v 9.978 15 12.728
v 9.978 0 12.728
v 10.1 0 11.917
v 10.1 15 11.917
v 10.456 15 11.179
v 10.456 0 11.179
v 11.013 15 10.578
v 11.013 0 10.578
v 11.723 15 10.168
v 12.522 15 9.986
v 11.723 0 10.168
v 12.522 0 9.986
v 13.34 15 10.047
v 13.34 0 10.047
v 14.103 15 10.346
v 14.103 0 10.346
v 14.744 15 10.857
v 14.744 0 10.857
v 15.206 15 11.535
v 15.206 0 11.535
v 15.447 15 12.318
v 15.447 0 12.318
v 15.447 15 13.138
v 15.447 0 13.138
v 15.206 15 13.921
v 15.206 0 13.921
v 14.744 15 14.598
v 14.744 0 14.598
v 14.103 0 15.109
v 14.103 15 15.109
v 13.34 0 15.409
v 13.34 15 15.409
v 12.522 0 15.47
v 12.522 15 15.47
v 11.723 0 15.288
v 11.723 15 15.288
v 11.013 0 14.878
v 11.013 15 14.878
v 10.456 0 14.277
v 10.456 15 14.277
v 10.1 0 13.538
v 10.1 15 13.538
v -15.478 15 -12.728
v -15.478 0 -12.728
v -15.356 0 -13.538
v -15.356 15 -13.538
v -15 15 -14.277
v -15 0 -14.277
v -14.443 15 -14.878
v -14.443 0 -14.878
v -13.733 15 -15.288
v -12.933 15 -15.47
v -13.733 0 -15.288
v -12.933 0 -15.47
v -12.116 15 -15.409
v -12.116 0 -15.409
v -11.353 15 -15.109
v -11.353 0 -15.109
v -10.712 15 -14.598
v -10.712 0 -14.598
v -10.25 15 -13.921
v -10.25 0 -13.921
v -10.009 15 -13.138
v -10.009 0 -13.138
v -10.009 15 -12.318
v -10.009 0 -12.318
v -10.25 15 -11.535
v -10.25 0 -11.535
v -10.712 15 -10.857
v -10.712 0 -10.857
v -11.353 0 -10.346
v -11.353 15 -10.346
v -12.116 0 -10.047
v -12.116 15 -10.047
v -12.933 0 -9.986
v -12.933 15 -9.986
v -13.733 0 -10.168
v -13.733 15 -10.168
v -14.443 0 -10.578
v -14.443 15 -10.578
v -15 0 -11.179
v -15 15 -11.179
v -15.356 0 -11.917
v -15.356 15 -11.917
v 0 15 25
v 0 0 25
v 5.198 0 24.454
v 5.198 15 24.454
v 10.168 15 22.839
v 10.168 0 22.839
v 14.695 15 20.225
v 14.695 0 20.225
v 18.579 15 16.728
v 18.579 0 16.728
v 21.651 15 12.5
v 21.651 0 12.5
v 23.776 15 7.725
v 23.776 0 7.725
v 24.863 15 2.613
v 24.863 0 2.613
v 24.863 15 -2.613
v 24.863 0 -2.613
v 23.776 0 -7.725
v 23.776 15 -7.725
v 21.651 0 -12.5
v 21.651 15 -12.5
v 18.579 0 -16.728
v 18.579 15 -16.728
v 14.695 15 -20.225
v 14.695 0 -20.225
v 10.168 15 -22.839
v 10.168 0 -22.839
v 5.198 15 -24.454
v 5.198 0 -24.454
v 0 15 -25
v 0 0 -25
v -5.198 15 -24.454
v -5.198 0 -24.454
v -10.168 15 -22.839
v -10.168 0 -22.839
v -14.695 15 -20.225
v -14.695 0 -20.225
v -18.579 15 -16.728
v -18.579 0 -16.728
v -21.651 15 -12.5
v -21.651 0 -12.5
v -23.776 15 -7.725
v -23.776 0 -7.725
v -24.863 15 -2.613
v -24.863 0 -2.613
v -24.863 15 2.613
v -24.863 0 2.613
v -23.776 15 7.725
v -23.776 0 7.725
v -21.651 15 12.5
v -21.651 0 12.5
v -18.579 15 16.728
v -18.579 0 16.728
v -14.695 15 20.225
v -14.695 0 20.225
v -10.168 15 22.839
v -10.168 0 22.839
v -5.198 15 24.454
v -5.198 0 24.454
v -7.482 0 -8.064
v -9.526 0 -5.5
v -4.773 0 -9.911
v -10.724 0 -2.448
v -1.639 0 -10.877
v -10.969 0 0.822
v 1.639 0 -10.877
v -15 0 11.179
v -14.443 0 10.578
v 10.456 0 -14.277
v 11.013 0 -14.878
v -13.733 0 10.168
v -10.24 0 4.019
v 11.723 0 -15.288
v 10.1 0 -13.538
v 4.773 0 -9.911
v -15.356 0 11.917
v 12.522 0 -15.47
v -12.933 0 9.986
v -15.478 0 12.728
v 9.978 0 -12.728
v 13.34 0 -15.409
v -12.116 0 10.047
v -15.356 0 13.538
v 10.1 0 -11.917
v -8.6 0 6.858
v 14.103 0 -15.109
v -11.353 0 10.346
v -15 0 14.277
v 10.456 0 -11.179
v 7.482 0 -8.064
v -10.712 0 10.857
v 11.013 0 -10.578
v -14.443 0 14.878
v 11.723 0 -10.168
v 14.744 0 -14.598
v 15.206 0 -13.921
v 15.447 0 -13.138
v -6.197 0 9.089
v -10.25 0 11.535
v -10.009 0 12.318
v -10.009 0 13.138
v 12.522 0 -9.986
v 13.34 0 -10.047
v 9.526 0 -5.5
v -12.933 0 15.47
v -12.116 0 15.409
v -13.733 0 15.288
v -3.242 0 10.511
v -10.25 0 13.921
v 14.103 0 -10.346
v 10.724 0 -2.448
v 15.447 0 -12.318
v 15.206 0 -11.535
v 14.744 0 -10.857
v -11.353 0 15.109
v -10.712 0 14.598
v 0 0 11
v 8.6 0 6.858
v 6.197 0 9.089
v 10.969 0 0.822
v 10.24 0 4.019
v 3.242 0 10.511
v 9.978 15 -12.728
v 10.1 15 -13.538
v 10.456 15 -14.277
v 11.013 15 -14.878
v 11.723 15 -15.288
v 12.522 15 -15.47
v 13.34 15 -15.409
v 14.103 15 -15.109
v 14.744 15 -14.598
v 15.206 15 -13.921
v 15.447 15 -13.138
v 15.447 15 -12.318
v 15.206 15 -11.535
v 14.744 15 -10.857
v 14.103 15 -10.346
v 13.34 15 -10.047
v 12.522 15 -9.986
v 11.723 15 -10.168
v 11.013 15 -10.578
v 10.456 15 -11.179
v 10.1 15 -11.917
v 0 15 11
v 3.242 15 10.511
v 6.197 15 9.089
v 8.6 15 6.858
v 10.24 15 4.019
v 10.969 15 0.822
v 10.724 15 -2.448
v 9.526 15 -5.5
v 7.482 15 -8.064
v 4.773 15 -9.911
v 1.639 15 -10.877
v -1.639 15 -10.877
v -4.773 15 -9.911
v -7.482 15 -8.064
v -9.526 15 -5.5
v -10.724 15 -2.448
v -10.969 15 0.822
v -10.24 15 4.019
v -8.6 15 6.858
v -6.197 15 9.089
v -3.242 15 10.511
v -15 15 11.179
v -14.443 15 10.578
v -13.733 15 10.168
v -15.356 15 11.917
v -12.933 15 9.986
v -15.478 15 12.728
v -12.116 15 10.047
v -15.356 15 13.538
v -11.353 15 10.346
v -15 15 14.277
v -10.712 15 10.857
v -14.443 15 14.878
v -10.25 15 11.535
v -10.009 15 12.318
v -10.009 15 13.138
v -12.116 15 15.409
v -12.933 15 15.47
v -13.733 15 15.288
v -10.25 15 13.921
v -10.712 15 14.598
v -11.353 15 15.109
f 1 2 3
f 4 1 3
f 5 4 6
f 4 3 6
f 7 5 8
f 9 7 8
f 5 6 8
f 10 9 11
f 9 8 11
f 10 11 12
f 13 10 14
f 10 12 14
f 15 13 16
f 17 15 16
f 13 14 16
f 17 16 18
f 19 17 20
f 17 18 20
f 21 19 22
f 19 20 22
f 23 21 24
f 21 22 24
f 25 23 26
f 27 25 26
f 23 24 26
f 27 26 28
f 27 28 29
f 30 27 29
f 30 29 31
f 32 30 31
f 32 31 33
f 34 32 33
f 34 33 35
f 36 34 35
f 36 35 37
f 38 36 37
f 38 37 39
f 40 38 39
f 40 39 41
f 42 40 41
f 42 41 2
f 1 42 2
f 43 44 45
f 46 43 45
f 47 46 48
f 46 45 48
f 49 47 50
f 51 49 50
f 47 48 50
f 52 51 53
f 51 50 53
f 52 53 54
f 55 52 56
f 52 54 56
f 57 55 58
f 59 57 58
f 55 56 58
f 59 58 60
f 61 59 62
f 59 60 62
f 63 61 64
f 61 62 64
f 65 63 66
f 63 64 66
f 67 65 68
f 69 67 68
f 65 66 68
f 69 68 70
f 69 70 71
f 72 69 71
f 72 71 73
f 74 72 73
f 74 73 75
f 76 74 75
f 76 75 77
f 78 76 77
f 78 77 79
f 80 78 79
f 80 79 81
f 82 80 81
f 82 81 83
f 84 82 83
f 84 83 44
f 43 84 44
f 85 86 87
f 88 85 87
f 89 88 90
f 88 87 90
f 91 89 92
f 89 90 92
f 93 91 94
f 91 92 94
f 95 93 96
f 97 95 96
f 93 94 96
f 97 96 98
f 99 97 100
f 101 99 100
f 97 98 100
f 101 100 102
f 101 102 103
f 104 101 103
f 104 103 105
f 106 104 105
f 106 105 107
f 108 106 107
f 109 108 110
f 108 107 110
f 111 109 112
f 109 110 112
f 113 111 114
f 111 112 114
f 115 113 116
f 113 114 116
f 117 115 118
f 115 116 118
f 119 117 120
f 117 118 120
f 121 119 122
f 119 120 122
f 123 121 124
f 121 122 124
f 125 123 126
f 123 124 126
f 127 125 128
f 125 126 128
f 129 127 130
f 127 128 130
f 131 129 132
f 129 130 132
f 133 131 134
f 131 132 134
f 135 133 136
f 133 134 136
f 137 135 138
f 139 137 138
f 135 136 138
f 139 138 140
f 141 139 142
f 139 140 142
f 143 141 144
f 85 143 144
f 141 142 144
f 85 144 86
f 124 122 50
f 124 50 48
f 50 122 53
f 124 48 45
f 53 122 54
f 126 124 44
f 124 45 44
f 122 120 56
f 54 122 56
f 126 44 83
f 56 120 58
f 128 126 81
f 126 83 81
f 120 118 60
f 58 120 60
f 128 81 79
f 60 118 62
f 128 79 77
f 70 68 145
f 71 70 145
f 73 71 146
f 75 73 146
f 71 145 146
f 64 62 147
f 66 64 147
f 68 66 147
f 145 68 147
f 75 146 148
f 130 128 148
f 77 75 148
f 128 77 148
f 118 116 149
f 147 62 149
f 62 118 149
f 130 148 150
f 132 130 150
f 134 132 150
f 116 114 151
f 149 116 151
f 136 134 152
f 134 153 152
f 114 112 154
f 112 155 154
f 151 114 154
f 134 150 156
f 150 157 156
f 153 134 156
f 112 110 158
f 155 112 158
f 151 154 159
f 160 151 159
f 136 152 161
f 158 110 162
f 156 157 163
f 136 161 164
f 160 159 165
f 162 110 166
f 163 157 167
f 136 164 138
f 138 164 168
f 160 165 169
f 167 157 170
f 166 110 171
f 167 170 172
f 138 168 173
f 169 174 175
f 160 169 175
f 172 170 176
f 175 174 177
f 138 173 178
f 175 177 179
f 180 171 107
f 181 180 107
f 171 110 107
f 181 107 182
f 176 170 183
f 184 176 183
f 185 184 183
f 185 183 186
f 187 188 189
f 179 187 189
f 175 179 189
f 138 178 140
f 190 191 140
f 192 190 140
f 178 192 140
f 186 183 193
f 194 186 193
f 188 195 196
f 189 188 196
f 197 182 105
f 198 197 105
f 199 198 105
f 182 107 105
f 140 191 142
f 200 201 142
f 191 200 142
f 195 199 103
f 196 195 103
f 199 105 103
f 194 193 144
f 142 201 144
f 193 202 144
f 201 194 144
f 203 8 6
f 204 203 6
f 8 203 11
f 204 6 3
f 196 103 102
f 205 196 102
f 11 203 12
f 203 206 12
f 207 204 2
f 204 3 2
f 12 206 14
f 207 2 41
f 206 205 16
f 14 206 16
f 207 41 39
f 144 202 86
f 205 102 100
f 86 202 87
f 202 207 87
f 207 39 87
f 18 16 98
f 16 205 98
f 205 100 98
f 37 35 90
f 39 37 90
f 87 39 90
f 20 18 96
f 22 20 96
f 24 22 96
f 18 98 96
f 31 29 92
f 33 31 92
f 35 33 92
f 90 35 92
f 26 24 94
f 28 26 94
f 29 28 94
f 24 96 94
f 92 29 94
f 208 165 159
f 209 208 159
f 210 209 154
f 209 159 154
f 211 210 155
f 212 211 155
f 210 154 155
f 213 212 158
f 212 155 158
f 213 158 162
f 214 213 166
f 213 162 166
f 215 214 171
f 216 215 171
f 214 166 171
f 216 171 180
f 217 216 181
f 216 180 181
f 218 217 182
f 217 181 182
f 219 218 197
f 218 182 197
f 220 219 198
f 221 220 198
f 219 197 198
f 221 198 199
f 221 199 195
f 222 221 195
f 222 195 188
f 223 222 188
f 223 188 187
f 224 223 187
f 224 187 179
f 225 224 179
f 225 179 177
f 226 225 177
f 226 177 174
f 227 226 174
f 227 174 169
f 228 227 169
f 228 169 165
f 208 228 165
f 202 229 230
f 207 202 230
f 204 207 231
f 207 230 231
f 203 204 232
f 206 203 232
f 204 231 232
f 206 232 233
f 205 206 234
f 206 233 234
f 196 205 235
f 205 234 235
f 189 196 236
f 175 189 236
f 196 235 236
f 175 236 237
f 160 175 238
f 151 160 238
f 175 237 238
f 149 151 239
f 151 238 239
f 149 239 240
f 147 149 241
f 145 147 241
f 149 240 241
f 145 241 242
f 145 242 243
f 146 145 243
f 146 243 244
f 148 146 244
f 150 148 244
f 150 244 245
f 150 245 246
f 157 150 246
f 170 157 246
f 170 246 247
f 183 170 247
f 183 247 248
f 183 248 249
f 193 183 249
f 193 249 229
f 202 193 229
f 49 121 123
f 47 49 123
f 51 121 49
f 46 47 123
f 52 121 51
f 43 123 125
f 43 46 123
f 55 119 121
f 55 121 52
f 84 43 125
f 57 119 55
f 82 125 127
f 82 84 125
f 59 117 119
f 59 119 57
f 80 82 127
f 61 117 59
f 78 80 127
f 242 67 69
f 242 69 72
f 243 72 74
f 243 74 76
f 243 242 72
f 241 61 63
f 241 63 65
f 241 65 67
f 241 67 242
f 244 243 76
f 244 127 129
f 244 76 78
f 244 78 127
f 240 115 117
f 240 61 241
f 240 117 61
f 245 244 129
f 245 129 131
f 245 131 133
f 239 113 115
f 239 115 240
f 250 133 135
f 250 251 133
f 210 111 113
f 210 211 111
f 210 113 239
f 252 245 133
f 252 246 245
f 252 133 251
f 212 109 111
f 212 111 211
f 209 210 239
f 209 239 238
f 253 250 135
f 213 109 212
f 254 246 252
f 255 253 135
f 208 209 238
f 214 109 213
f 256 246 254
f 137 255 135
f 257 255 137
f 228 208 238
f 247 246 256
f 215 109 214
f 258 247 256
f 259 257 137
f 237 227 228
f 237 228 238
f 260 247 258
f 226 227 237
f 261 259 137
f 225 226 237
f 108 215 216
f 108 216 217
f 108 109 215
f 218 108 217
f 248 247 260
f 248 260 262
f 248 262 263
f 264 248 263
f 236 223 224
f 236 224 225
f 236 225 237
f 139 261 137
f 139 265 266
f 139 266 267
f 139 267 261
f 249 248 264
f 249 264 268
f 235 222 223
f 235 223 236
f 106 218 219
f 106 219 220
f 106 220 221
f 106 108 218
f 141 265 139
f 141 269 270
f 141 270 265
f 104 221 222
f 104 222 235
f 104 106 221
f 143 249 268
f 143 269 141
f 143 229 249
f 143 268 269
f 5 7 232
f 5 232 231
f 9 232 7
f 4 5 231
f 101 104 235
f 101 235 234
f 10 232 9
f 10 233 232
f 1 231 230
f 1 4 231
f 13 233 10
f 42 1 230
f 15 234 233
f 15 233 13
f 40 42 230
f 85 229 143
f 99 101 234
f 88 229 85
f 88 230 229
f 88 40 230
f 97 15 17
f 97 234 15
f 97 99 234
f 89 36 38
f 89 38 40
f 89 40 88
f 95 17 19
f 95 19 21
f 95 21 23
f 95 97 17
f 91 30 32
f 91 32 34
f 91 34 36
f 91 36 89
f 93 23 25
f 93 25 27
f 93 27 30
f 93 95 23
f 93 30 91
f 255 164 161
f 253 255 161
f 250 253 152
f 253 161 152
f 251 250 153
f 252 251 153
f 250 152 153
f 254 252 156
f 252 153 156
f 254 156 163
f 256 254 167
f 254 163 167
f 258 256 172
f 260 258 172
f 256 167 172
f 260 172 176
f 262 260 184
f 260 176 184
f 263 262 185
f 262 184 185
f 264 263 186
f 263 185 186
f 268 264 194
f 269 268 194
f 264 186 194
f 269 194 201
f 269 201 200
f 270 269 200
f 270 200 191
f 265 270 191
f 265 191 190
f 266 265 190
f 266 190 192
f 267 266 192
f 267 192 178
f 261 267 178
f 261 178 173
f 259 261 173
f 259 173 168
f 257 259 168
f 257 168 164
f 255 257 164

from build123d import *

# Parameters (mm, degrees)
SKETCH_1_R          = 25
EXTRUDE_1_DEPTH     = 15
SKETCH_2_R          = 11
CUT_EXTRUDE_1_DEPTH = 39.405728739
HOLE_WIZARD_M5_1_D  = 5.5


with BuildPart() as part:
    # ｽｹｯﾁ1 → ﾎﾞｽ - 押し出し1 (new body)
    with BuildSketch(Plane(origin=(0, 0, 0), x_dir=(1, 0, 0), z_dir=(0, 1, 0))):
        with Locations(Location((0, 0, 0), (0, 0, 270))):
            Circle(SKETCH_1_R)
    extrude(amount=EXTRUDE_1_DEPTH)

    # ｽｹｯﾁ2 → ｶｯﾄ - 押し出し1 (cut, through all)
    with BuildSketch(Plane(origin=(0, 15, 0), x_dir=(1, 0, 0), z_dir=(0, 1, 0))):
        with Locations(Location((0, 0, 0), (0, 0, 270))):
            Circle(SKETCH_2_R)
    extrude(amount=-CUT_EXTRUDE_1_DEPTH, mode=Mode.SUBTRACT)

    # M5 すきま穴1 (through all)
    with Locations(Plane(origin=(0, 15, 0), x_dir=(1, 0, 0), z_dir=(0, 1, 0))):
        with Locations((-12.727922061, 12.727922061), (12.727922061, -12.727922061), (-12.727922061, -12.727922061), (12.727922061, 12.727922061)):
            Hole(HOLE_WIZARD_M5_1_D / 2)


solid = part.part
